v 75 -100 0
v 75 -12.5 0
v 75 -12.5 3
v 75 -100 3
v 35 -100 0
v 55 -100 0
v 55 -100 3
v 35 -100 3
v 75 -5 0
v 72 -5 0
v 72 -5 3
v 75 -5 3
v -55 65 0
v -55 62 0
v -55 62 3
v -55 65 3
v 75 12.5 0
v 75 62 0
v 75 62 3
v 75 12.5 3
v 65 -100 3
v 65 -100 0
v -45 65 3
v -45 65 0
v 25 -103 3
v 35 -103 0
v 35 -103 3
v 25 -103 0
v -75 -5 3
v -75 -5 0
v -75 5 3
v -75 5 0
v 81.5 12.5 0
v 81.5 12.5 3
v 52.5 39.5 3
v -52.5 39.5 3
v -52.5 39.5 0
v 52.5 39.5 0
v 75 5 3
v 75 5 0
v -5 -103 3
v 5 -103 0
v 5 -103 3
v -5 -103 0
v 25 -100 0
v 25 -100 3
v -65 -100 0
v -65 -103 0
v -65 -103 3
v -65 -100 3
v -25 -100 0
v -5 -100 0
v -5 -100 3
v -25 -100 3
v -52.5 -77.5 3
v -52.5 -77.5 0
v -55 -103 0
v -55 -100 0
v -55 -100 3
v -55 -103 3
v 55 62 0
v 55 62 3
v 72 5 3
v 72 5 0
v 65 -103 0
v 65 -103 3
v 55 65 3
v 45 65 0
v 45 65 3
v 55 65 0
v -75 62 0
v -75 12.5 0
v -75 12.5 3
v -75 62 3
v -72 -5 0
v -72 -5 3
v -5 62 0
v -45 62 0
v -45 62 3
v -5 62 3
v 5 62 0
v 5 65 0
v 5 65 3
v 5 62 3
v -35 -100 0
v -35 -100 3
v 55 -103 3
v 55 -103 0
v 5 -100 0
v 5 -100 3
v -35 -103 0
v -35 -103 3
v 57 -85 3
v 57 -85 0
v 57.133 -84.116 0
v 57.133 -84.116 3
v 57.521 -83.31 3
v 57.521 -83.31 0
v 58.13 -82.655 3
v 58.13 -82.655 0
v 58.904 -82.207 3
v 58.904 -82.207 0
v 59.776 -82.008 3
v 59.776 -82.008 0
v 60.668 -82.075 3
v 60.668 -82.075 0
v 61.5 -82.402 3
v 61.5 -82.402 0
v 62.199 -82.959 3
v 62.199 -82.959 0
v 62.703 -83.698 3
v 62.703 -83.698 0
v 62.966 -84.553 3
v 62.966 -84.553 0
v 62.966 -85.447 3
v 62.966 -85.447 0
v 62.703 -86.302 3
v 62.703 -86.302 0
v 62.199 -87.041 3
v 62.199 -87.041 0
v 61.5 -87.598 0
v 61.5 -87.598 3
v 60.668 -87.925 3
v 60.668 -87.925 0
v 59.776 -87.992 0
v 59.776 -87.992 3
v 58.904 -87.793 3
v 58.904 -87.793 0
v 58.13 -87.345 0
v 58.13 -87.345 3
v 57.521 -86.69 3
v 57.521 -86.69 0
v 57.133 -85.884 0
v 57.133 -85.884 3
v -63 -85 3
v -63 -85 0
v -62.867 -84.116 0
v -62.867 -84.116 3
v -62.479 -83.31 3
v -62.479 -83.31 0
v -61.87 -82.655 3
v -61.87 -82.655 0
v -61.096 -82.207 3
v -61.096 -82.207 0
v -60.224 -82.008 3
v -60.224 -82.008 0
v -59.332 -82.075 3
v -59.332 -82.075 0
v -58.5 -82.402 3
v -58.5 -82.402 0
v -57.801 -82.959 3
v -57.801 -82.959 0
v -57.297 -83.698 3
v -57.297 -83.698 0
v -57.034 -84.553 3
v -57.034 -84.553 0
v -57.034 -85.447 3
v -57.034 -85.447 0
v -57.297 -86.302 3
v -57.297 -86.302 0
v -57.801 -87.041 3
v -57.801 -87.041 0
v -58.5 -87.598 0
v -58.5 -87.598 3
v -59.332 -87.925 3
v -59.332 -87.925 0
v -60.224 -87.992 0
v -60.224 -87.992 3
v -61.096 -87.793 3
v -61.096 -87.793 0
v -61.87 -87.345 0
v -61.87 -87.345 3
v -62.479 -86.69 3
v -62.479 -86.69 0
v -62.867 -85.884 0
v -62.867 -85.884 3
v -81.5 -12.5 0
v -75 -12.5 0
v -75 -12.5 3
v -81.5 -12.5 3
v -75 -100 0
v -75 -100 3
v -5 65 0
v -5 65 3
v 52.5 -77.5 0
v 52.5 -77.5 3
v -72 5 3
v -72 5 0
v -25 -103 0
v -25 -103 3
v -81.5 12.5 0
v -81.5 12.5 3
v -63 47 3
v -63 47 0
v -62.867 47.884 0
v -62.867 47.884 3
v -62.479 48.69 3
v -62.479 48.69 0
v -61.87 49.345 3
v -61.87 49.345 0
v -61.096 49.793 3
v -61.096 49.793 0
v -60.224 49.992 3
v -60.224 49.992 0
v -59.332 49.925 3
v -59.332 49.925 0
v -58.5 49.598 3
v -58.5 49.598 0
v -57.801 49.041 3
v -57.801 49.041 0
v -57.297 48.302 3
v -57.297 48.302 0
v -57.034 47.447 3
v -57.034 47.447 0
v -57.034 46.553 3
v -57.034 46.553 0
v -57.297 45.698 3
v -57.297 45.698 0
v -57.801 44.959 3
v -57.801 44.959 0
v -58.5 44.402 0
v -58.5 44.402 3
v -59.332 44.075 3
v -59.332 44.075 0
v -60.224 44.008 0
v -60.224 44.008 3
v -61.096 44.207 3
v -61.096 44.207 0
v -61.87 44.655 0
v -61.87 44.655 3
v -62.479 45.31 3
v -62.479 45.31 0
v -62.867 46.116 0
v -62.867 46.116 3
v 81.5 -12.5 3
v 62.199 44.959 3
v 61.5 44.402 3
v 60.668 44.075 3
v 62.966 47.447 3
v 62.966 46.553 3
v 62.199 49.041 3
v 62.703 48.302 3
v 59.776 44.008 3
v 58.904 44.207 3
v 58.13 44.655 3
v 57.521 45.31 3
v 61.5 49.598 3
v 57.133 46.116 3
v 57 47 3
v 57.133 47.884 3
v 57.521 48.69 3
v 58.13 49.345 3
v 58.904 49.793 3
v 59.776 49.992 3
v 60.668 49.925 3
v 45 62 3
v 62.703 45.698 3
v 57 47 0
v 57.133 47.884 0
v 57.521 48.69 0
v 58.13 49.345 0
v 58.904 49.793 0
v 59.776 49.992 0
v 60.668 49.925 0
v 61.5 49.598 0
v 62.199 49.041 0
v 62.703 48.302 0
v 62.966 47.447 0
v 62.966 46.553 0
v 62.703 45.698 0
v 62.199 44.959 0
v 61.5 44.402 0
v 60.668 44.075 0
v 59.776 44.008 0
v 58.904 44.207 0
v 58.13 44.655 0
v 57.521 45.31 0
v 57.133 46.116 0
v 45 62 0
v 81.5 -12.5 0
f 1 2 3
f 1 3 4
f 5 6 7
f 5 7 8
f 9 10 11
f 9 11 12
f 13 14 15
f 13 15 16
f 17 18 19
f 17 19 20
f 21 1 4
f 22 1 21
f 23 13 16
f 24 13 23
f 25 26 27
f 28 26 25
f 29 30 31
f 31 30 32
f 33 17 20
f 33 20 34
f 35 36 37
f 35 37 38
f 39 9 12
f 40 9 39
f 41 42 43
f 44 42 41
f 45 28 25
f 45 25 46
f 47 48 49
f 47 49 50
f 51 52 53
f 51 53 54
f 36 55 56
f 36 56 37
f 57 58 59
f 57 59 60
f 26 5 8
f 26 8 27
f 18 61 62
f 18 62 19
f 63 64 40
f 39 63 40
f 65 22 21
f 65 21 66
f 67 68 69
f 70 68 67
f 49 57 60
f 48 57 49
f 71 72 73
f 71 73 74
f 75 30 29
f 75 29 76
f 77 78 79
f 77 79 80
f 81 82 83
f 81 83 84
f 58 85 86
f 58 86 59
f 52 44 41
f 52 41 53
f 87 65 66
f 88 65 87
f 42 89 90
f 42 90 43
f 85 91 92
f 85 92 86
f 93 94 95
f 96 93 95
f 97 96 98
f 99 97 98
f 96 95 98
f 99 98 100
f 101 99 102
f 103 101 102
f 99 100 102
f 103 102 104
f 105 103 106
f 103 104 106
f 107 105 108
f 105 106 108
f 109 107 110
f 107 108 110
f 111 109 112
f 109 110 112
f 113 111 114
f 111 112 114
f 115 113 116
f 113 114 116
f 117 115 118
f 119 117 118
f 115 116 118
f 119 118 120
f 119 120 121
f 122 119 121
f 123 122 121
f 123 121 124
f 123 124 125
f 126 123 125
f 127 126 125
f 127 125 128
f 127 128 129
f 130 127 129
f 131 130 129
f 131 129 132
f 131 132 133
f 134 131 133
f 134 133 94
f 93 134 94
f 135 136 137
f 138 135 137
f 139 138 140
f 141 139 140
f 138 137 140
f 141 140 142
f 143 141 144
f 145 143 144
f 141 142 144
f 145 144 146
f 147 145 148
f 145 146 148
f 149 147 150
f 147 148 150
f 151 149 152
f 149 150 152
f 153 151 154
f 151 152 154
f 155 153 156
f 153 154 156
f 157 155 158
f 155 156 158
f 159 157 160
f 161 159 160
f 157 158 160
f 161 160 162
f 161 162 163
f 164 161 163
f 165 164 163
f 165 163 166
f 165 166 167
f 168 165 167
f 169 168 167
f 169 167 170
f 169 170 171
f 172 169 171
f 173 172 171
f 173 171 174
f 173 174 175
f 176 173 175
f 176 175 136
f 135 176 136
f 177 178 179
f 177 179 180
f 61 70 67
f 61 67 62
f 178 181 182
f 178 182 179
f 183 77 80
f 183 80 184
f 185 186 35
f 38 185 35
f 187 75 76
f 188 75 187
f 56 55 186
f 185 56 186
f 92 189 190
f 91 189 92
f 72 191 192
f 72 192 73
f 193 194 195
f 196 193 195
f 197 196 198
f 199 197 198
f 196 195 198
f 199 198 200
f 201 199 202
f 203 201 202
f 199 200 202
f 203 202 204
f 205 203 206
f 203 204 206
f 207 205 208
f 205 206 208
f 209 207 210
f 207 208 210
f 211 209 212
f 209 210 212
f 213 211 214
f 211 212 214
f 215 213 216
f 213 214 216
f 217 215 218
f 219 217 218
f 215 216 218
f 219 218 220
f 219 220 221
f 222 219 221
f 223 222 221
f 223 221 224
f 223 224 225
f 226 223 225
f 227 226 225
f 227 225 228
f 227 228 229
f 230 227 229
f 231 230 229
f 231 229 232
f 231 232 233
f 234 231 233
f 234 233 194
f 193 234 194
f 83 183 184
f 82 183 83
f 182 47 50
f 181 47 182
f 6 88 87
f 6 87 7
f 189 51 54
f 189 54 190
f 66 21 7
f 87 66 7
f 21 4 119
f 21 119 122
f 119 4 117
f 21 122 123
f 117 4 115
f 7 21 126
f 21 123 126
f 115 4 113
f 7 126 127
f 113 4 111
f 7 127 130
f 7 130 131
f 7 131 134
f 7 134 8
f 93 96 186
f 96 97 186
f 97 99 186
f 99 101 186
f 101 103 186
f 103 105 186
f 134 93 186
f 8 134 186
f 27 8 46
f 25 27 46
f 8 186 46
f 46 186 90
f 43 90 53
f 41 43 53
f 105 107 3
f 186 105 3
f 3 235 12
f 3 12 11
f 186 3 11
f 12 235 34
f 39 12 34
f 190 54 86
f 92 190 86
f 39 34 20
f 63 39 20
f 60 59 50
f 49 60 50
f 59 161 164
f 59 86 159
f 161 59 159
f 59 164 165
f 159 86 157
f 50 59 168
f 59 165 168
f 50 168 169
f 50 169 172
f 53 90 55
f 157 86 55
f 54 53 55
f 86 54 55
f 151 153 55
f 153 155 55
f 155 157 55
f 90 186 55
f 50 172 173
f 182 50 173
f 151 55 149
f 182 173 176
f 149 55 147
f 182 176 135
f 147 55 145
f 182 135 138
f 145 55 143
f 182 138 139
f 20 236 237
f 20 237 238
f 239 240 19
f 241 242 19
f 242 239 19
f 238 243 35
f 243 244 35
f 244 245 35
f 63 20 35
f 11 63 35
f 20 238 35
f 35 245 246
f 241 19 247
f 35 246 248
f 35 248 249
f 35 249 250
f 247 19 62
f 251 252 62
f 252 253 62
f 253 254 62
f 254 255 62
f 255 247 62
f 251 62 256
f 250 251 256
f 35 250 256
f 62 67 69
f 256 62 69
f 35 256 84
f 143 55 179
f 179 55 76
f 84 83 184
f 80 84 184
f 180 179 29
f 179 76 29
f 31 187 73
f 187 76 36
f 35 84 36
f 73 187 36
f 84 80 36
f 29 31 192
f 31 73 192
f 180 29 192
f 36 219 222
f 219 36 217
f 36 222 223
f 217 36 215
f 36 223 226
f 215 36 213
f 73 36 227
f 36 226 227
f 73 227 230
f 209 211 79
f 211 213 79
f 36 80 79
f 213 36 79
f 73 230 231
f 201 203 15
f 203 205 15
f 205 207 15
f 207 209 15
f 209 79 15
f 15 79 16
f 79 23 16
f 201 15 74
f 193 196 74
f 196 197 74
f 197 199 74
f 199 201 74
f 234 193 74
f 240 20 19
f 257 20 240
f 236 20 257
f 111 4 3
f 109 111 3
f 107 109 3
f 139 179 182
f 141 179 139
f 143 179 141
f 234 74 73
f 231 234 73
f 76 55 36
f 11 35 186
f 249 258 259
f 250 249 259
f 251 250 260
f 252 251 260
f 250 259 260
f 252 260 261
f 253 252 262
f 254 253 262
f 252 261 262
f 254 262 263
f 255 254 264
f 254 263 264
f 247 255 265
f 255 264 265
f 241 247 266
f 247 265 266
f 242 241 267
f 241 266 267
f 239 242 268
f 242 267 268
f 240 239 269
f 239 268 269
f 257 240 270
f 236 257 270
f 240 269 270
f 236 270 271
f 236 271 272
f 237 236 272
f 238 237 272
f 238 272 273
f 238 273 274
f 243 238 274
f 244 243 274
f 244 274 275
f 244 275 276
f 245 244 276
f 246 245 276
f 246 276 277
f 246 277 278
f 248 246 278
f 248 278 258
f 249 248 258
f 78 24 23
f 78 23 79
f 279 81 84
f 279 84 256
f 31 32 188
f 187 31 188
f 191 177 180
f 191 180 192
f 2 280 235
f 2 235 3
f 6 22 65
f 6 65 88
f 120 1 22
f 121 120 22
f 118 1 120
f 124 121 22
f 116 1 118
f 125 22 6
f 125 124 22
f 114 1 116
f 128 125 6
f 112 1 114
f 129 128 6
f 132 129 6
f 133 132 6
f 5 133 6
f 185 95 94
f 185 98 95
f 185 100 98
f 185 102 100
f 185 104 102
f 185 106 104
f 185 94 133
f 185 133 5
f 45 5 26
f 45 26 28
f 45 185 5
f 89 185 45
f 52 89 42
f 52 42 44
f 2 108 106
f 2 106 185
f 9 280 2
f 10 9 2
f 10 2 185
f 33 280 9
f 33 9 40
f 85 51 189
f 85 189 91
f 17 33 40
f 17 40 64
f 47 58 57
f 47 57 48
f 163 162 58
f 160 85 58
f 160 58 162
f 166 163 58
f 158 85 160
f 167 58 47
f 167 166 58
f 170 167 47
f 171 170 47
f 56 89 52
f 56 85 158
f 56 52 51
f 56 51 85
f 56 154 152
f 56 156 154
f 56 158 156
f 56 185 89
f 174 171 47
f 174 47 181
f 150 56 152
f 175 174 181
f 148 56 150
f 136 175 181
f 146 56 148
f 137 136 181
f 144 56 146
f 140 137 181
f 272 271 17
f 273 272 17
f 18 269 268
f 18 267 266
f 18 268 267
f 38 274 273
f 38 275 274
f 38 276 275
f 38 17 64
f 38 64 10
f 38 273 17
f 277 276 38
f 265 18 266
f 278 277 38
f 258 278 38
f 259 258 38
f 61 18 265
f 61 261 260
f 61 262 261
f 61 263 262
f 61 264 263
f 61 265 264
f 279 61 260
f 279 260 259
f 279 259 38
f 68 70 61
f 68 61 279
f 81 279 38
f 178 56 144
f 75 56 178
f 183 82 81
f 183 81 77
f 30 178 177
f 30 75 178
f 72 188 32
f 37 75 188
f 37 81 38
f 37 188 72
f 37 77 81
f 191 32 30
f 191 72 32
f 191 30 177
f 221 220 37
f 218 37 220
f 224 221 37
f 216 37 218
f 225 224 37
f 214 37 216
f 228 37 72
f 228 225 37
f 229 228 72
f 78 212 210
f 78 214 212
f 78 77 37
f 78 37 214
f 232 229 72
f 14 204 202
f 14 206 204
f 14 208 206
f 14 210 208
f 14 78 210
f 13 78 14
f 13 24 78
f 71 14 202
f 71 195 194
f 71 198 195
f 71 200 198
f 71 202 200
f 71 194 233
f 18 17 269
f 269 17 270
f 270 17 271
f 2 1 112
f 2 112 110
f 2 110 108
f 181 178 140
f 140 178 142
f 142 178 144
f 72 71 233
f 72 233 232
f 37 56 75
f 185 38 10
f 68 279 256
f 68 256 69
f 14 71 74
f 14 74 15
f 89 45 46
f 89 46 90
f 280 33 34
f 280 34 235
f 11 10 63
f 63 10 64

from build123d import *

# Parameters (mm, degrees)
SKETCH1_W                = 3
SKETCH1_H                = 10
BOSS_EXTRUDE2_DEPTH      = 3
F_6_0_6_DIAMETER_HOLE1_D = 6
SKETCH5_W                = 105
SKETCH5_H                = 117
CUT_EXTRUDE1_DEPTH       = 10


with BuildPart() as part:
    # Sketch1 → Boss-Extrude2 (new body)
    with BuildSketch(Plane.XY):
        Polygon((-5, 65), (5, 65), (5, 62), (45, 62), (45, 65), (55, 65), (55, 62), (75, 62), (75, 12.5), (81.5, 12.5), (81.5, -12.5), (75, -12.5), (75, -100), (65, -100), (65, -103), (55, -103), (55, -100), (35, -100), (35, -103), (25, -103), (25, -100), (5, -100), (5, -103), (-5, -103), (-5, -100), (-25, -100), (-25, -103), (-35, -103), (-35, -100), (-55, -100), (-55, -103), (-65, -103), (-65, -100), (-75, -100), (-75, -12.5), (-81.5, -12.5), (-81.5, 12.5), (-75, 12.5), (-75, 62), (-55, 62), (-55, 65), (-45, 65), (-45, 62), (-5, 62), align=None)
        with Locations((-73.5, 0)):
            Rectangle(SKETCH1_W, SKETCH1_H, mode=Mode.SUBTRACT)
        with Locations((73.5, 0)):
            Rectangle(SKETCH1_W, SKETCH1_H, mode=Mode.SUBTRACT)
    extrude(amount=BOSS_EXTRUDE2_DEPTH)

    # Ø6.0 (6) Diameter Hole1 (through all)
    with Locations(Plane.XY.offset(3)):
        with Locations((-60, 47), (60, 47), (-60, -85), (60, -85)):
            Hole(F_6_0_6_DIAMETER_HOLE1_D / 2)

    # Sketch5 → Cut-Extrude1 (cut)
    with BuildSketch(Plane.XY.offset(3)):
        with Locations((0, -19)):
            Rectangle(SKETCH5_W, SKETCH5_H)
    extrude(amount=-CUT_EXTRUDE1_DEPTH, mode=Mode.SUBTRACT)


solid = part.part
